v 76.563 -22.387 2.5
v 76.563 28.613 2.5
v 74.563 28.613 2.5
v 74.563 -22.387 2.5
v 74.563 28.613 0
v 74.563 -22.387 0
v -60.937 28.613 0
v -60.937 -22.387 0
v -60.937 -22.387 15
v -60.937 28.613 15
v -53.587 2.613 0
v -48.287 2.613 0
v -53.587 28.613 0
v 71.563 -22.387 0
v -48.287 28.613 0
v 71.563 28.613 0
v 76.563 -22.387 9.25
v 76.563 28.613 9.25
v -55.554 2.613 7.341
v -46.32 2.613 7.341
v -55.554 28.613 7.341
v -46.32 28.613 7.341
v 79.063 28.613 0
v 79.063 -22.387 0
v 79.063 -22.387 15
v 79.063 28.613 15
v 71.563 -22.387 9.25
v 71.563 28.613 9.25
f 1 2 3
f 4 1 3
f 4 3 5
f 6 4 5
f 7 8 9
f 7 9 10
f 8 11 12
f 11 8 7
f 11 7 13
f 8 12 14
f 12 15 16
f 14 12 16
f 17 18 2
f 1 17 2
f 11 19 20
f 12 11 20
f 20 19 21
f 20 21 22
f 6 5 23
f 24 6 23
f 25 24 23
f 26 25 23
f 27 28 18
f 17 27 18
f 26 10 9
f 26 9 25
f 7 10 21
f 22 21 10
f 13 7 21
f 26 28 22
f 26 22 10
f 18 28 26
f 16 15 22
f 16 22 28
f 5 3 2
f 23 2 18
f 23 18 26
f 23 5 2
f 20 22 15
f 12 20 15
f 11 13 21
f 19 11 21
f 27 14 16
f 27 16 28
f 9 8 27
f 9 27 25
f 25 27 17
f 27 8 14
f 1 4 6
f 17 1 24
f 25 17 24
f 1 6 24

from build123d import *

# Parameters (mm, degrees)
SKETCH1_W               = 140
SKETCH1_H               = 51
BOSS_EXTRUDE1_DEPTH     = 15
CUT_EXTRUDE1_DEPTH      = 52
CUT_EXTRUDE2_DEPTH      = 1
CUT_EXTRUDE2_DEPTH_BACK = 26


with BuildPart() as part:
    # Sketch1 → Boss-Extrude1 (new body)
    with BuildSketch(Plane.XY):
        with Locations((9.063380282, 3.112676056)):
            Rectangle(SKETCH1_W, SKETCH1_H)
    extrude(amount=BOSS_EXTRUDE1_DEPTH)

    # Sketch2 → Cut-Extrude1 (cut, through all)
    with BuildSketch(Plane(origin=(0, 28.612676056, 0), x_dir=(1, 0, 0), z_dir=(0, 1, 0))):
        Polygon((74.563380282, -2.5), (74.563380282, 0), (71.563380282, 0), (71.563380282, -2.5), (71.563380282, -9.25), (76.563380282, -9.25), (76.563380282, -2.5), align=None)
    extrude(amount=-CUT_EXTRUDE1_DEPTH, mode=Mode.SUBTRACT)

    # Sketch3 → Cut-Extrude2 (cut, two sides)
    with BuildSketch(Plane(origin=(0, 28.612676056, 0), x_dir=(1, 0, 0), z_dir=(0, 1, 0))) as cut_extrude2_sk:
        Polygon((-352.539176525, 0), (-60.936619718, 0), (-53.586619718, 0), (-55.553644461, -7.34103628), (-46.319594976, -7.34103628), (-48.286619718, 0), (-123.75891502, 281.666440631), (-576.450550722, 649.359910128), (-805.230812226, 367.693469497), align=None)
    extrude(amount=CUT_EXTRUDE2_DEPTH, mode=Mode.SUBTRACT)
    extrude(cut_extrude2_sk.sketch, amount=-CUT_EXTRUDE2_DEPTH_BACK, mode=Mode.SUBTRACT)


solid = part.part
